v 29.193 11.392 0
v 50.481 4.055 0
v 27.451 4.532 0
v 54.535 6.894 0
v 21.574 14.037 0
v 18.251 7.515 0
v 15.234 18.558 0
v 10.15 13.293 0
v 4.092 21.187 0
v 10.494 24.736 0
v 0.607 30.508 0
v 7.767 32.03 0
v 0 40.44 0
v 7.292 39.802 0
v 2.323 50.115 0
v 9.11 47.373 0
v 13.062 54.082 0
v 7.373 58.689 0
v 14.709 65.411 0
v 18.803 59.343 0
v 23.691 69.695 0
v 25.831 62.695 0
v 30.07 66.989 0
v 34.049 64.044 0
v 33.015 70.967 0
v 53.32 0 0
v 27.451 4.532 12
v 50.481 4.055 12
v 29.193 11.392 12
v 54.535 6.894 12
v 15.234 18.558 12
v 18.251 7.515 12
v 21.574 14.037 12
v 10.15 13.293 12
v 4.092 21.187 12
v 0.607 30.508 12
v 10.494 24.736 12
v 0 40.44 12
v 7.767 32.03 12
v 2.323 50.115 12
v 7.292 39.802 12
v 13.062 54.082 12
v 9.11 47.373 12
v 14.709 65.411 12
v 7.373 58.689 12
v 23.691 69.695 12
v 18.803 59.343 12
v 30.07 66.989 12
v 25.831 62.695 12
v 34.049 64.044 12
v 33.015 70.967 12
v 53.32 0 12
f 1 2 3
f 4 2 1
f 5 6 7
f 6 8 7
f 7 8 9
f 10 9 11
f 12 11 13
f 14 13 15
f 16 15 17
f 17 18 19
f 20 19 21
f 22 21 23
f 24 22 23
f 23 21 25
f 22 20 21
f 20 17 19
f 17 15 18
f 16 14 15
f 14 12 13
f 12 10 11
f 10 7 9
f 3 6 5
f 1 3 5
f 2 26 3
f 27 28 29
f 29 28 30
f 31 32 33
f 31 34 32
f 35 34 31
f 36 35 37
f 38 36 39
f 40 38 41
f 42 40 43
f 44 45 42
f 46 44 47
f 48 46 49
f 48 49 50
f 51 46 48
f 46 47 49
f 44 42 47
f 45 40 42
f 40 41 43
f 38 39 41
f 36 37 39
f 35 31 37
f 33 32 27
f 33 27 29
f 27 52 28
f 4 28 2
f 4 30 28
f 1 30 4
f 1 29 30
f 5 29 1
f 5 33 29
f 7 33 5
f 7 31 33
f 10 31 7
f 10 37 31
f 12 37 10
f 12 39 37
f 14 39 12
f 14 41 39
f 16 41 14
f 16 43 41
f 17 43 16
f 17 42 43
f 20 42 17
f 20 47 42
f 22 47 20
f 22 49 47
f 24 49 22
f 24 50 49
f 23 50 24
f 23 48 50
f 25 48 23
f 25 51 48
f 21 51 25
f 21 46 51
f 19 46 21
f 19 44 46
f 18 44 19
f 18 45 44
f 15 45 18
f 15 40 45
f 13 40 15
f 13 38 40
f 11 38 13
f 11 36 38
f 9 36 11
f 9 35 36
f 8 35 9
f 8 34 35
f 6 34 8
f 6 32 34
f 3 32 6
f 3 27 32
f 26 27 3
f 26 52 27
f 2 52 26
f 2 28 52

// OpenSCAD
$fn = 32;

// ----------------------------------------------------------------------
// Hook plate: curl radius 30 mm over 170 degrees, 7 mm thick band
// ----------------------------------------------------------------------

// --- parameters (mm) ---
profile_height = 12;      // extrusion height
profile_points = 26;      // points of the closed outline

profile = [[30.07, 66.989], [33.015, 70.967], [23.691, 69.695], [14.709, 65.411], [7.373, 58.689], [2.323, 50.115], [0, 40.44], [0.607, 30.508], [4.092, 21.187], [10.15, 13.293], [18.251, 7.515], [27.451, 4.532], [53.32, 0], [50.481, 4.055], [54.535, 6.894], [29.193, 11.392], [21.574, 14.037], [15.234, 18.558], [10.494, 24.736], [7.767, 32.03], [7.292, 39.802], [9.11, 47.373], [13.062, 54.082], [18.803, 59.343], [25.831, 62.695], [34.049, 64.044]];  // single closed polygon, 26 points, counter clockwise

// --- the one profile operation ---
linear_extrude(height = profile_height) polygon(points = profile);
